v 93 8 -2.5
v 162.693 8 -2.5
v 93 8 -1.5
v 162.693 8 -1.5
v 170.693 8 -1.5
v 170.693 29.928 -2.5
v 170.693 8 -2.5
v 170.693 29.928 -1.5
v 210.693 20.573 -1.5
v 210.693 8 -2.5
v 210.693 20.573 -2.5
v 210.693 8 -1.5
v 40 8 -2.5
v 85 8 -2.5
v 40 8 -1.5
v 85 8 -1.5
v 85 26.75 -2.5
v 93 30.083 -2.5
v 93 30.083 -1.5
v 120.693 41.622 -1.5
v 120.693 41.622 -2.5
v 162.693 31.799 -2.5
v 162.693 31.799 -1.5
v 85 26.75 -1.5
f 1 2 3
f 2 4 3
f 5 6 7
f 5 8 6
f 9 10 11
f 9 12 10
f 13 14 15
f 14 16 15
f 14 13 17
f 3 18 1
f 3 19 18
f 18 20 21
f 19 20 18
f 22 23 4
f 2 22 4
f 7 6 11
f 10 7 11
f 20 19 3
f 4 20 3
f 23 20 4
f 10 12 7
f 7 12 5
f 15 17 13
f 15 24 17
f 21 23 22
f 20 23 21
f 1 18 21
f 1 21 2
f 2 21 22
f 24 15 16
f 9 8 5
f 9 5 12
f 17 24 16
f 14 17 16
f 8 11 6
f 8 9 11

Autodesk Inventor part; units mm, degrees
ref_plane "YZ Plane" through (0, 0, 0) normal (1, 0, 0) x (0, 1, 0)
ref_plane "XZ Plane" through (0, 0, 0) normal (0, 1, 0) x (-1, 0, 0)
ref_plane "XY Plane" through (0, 0, 0) normal (0, 0, 1) x (1, 0, 0)
sketch "Sketch1" plane through (0, 0, 0) normal (0, 0, 1) x (1, 0, 0)
  line L0 (13.8455, -58.3807) -> (313.7199, -67.0622)
  line L1 (313.7199, -67.0622) -> (333.7863, 0)
  line L2 (13.8455, -58.3807) -> (0, 0)
  line L3 (0, 0) -> (333.7863, 0)
  line L4 (120, 50) -> (333.7863, 0)
  line L5 (120, 50) -> (0, 0)
  line L6 (120.6929, 41.6221) -> (40, 8)
  line L7 (210.6929, 8) -> (210.6929, 20.573)
  line L8 (210.6929, 20.573) -> (120.6929, 41.6221)
  line L9 (85, 26.75) -> (85, 8)
  line L10 (120.6929, 41.6221) -> (122.5148, 49.4118)
  line L11 (120.6929, 41.6221) -> (117.616, 49.0067)
  line L12 (210.6929, 8) -> (210.6929, 0)
  line L13 (170.6929, 29.9281) -> (170.6929, 8)
  line L14 (93, 30.0833) -> (93, 8)
  line L15 (85, 8) -> (93, 8)
  line L16 (162.6929, 31.7992) -> (162.6929, 8)
  line L17 (162.6929, 8) -> (170.6929, 8)
  line L18 (210.6929, 8) -> (40, 8)
  point P0 (170.6929, 8)
  dimension "d228" = 105
  dimension "d268" = 60
  dimension "d269" = 70
  dimension "d270" = 300
  dimension "d273" = 120
  dimension "d274" = 50
  dimension "d275" = 105
  dimension "d283" = 90
  dimension "d284" = 40
  dimension "d285" = 45
  dimension "d289" = 8
  dimension "d290" = 8
extrude "Extrusion1" add sketch "Sketch1" against normal blind 2.5 contours L18 L13 L8 L7 | L8 L16 L18 L14 L6 | L9 L18 L6
extrude "Extrusion2" cut sketch "Sketch1" against normal blind 1.5 contours L18 L13 L8 L7 | L8 L16 L18 L14 L6 | L9 L18 L6
properties part number "Langbektang houder" material "Glass"
